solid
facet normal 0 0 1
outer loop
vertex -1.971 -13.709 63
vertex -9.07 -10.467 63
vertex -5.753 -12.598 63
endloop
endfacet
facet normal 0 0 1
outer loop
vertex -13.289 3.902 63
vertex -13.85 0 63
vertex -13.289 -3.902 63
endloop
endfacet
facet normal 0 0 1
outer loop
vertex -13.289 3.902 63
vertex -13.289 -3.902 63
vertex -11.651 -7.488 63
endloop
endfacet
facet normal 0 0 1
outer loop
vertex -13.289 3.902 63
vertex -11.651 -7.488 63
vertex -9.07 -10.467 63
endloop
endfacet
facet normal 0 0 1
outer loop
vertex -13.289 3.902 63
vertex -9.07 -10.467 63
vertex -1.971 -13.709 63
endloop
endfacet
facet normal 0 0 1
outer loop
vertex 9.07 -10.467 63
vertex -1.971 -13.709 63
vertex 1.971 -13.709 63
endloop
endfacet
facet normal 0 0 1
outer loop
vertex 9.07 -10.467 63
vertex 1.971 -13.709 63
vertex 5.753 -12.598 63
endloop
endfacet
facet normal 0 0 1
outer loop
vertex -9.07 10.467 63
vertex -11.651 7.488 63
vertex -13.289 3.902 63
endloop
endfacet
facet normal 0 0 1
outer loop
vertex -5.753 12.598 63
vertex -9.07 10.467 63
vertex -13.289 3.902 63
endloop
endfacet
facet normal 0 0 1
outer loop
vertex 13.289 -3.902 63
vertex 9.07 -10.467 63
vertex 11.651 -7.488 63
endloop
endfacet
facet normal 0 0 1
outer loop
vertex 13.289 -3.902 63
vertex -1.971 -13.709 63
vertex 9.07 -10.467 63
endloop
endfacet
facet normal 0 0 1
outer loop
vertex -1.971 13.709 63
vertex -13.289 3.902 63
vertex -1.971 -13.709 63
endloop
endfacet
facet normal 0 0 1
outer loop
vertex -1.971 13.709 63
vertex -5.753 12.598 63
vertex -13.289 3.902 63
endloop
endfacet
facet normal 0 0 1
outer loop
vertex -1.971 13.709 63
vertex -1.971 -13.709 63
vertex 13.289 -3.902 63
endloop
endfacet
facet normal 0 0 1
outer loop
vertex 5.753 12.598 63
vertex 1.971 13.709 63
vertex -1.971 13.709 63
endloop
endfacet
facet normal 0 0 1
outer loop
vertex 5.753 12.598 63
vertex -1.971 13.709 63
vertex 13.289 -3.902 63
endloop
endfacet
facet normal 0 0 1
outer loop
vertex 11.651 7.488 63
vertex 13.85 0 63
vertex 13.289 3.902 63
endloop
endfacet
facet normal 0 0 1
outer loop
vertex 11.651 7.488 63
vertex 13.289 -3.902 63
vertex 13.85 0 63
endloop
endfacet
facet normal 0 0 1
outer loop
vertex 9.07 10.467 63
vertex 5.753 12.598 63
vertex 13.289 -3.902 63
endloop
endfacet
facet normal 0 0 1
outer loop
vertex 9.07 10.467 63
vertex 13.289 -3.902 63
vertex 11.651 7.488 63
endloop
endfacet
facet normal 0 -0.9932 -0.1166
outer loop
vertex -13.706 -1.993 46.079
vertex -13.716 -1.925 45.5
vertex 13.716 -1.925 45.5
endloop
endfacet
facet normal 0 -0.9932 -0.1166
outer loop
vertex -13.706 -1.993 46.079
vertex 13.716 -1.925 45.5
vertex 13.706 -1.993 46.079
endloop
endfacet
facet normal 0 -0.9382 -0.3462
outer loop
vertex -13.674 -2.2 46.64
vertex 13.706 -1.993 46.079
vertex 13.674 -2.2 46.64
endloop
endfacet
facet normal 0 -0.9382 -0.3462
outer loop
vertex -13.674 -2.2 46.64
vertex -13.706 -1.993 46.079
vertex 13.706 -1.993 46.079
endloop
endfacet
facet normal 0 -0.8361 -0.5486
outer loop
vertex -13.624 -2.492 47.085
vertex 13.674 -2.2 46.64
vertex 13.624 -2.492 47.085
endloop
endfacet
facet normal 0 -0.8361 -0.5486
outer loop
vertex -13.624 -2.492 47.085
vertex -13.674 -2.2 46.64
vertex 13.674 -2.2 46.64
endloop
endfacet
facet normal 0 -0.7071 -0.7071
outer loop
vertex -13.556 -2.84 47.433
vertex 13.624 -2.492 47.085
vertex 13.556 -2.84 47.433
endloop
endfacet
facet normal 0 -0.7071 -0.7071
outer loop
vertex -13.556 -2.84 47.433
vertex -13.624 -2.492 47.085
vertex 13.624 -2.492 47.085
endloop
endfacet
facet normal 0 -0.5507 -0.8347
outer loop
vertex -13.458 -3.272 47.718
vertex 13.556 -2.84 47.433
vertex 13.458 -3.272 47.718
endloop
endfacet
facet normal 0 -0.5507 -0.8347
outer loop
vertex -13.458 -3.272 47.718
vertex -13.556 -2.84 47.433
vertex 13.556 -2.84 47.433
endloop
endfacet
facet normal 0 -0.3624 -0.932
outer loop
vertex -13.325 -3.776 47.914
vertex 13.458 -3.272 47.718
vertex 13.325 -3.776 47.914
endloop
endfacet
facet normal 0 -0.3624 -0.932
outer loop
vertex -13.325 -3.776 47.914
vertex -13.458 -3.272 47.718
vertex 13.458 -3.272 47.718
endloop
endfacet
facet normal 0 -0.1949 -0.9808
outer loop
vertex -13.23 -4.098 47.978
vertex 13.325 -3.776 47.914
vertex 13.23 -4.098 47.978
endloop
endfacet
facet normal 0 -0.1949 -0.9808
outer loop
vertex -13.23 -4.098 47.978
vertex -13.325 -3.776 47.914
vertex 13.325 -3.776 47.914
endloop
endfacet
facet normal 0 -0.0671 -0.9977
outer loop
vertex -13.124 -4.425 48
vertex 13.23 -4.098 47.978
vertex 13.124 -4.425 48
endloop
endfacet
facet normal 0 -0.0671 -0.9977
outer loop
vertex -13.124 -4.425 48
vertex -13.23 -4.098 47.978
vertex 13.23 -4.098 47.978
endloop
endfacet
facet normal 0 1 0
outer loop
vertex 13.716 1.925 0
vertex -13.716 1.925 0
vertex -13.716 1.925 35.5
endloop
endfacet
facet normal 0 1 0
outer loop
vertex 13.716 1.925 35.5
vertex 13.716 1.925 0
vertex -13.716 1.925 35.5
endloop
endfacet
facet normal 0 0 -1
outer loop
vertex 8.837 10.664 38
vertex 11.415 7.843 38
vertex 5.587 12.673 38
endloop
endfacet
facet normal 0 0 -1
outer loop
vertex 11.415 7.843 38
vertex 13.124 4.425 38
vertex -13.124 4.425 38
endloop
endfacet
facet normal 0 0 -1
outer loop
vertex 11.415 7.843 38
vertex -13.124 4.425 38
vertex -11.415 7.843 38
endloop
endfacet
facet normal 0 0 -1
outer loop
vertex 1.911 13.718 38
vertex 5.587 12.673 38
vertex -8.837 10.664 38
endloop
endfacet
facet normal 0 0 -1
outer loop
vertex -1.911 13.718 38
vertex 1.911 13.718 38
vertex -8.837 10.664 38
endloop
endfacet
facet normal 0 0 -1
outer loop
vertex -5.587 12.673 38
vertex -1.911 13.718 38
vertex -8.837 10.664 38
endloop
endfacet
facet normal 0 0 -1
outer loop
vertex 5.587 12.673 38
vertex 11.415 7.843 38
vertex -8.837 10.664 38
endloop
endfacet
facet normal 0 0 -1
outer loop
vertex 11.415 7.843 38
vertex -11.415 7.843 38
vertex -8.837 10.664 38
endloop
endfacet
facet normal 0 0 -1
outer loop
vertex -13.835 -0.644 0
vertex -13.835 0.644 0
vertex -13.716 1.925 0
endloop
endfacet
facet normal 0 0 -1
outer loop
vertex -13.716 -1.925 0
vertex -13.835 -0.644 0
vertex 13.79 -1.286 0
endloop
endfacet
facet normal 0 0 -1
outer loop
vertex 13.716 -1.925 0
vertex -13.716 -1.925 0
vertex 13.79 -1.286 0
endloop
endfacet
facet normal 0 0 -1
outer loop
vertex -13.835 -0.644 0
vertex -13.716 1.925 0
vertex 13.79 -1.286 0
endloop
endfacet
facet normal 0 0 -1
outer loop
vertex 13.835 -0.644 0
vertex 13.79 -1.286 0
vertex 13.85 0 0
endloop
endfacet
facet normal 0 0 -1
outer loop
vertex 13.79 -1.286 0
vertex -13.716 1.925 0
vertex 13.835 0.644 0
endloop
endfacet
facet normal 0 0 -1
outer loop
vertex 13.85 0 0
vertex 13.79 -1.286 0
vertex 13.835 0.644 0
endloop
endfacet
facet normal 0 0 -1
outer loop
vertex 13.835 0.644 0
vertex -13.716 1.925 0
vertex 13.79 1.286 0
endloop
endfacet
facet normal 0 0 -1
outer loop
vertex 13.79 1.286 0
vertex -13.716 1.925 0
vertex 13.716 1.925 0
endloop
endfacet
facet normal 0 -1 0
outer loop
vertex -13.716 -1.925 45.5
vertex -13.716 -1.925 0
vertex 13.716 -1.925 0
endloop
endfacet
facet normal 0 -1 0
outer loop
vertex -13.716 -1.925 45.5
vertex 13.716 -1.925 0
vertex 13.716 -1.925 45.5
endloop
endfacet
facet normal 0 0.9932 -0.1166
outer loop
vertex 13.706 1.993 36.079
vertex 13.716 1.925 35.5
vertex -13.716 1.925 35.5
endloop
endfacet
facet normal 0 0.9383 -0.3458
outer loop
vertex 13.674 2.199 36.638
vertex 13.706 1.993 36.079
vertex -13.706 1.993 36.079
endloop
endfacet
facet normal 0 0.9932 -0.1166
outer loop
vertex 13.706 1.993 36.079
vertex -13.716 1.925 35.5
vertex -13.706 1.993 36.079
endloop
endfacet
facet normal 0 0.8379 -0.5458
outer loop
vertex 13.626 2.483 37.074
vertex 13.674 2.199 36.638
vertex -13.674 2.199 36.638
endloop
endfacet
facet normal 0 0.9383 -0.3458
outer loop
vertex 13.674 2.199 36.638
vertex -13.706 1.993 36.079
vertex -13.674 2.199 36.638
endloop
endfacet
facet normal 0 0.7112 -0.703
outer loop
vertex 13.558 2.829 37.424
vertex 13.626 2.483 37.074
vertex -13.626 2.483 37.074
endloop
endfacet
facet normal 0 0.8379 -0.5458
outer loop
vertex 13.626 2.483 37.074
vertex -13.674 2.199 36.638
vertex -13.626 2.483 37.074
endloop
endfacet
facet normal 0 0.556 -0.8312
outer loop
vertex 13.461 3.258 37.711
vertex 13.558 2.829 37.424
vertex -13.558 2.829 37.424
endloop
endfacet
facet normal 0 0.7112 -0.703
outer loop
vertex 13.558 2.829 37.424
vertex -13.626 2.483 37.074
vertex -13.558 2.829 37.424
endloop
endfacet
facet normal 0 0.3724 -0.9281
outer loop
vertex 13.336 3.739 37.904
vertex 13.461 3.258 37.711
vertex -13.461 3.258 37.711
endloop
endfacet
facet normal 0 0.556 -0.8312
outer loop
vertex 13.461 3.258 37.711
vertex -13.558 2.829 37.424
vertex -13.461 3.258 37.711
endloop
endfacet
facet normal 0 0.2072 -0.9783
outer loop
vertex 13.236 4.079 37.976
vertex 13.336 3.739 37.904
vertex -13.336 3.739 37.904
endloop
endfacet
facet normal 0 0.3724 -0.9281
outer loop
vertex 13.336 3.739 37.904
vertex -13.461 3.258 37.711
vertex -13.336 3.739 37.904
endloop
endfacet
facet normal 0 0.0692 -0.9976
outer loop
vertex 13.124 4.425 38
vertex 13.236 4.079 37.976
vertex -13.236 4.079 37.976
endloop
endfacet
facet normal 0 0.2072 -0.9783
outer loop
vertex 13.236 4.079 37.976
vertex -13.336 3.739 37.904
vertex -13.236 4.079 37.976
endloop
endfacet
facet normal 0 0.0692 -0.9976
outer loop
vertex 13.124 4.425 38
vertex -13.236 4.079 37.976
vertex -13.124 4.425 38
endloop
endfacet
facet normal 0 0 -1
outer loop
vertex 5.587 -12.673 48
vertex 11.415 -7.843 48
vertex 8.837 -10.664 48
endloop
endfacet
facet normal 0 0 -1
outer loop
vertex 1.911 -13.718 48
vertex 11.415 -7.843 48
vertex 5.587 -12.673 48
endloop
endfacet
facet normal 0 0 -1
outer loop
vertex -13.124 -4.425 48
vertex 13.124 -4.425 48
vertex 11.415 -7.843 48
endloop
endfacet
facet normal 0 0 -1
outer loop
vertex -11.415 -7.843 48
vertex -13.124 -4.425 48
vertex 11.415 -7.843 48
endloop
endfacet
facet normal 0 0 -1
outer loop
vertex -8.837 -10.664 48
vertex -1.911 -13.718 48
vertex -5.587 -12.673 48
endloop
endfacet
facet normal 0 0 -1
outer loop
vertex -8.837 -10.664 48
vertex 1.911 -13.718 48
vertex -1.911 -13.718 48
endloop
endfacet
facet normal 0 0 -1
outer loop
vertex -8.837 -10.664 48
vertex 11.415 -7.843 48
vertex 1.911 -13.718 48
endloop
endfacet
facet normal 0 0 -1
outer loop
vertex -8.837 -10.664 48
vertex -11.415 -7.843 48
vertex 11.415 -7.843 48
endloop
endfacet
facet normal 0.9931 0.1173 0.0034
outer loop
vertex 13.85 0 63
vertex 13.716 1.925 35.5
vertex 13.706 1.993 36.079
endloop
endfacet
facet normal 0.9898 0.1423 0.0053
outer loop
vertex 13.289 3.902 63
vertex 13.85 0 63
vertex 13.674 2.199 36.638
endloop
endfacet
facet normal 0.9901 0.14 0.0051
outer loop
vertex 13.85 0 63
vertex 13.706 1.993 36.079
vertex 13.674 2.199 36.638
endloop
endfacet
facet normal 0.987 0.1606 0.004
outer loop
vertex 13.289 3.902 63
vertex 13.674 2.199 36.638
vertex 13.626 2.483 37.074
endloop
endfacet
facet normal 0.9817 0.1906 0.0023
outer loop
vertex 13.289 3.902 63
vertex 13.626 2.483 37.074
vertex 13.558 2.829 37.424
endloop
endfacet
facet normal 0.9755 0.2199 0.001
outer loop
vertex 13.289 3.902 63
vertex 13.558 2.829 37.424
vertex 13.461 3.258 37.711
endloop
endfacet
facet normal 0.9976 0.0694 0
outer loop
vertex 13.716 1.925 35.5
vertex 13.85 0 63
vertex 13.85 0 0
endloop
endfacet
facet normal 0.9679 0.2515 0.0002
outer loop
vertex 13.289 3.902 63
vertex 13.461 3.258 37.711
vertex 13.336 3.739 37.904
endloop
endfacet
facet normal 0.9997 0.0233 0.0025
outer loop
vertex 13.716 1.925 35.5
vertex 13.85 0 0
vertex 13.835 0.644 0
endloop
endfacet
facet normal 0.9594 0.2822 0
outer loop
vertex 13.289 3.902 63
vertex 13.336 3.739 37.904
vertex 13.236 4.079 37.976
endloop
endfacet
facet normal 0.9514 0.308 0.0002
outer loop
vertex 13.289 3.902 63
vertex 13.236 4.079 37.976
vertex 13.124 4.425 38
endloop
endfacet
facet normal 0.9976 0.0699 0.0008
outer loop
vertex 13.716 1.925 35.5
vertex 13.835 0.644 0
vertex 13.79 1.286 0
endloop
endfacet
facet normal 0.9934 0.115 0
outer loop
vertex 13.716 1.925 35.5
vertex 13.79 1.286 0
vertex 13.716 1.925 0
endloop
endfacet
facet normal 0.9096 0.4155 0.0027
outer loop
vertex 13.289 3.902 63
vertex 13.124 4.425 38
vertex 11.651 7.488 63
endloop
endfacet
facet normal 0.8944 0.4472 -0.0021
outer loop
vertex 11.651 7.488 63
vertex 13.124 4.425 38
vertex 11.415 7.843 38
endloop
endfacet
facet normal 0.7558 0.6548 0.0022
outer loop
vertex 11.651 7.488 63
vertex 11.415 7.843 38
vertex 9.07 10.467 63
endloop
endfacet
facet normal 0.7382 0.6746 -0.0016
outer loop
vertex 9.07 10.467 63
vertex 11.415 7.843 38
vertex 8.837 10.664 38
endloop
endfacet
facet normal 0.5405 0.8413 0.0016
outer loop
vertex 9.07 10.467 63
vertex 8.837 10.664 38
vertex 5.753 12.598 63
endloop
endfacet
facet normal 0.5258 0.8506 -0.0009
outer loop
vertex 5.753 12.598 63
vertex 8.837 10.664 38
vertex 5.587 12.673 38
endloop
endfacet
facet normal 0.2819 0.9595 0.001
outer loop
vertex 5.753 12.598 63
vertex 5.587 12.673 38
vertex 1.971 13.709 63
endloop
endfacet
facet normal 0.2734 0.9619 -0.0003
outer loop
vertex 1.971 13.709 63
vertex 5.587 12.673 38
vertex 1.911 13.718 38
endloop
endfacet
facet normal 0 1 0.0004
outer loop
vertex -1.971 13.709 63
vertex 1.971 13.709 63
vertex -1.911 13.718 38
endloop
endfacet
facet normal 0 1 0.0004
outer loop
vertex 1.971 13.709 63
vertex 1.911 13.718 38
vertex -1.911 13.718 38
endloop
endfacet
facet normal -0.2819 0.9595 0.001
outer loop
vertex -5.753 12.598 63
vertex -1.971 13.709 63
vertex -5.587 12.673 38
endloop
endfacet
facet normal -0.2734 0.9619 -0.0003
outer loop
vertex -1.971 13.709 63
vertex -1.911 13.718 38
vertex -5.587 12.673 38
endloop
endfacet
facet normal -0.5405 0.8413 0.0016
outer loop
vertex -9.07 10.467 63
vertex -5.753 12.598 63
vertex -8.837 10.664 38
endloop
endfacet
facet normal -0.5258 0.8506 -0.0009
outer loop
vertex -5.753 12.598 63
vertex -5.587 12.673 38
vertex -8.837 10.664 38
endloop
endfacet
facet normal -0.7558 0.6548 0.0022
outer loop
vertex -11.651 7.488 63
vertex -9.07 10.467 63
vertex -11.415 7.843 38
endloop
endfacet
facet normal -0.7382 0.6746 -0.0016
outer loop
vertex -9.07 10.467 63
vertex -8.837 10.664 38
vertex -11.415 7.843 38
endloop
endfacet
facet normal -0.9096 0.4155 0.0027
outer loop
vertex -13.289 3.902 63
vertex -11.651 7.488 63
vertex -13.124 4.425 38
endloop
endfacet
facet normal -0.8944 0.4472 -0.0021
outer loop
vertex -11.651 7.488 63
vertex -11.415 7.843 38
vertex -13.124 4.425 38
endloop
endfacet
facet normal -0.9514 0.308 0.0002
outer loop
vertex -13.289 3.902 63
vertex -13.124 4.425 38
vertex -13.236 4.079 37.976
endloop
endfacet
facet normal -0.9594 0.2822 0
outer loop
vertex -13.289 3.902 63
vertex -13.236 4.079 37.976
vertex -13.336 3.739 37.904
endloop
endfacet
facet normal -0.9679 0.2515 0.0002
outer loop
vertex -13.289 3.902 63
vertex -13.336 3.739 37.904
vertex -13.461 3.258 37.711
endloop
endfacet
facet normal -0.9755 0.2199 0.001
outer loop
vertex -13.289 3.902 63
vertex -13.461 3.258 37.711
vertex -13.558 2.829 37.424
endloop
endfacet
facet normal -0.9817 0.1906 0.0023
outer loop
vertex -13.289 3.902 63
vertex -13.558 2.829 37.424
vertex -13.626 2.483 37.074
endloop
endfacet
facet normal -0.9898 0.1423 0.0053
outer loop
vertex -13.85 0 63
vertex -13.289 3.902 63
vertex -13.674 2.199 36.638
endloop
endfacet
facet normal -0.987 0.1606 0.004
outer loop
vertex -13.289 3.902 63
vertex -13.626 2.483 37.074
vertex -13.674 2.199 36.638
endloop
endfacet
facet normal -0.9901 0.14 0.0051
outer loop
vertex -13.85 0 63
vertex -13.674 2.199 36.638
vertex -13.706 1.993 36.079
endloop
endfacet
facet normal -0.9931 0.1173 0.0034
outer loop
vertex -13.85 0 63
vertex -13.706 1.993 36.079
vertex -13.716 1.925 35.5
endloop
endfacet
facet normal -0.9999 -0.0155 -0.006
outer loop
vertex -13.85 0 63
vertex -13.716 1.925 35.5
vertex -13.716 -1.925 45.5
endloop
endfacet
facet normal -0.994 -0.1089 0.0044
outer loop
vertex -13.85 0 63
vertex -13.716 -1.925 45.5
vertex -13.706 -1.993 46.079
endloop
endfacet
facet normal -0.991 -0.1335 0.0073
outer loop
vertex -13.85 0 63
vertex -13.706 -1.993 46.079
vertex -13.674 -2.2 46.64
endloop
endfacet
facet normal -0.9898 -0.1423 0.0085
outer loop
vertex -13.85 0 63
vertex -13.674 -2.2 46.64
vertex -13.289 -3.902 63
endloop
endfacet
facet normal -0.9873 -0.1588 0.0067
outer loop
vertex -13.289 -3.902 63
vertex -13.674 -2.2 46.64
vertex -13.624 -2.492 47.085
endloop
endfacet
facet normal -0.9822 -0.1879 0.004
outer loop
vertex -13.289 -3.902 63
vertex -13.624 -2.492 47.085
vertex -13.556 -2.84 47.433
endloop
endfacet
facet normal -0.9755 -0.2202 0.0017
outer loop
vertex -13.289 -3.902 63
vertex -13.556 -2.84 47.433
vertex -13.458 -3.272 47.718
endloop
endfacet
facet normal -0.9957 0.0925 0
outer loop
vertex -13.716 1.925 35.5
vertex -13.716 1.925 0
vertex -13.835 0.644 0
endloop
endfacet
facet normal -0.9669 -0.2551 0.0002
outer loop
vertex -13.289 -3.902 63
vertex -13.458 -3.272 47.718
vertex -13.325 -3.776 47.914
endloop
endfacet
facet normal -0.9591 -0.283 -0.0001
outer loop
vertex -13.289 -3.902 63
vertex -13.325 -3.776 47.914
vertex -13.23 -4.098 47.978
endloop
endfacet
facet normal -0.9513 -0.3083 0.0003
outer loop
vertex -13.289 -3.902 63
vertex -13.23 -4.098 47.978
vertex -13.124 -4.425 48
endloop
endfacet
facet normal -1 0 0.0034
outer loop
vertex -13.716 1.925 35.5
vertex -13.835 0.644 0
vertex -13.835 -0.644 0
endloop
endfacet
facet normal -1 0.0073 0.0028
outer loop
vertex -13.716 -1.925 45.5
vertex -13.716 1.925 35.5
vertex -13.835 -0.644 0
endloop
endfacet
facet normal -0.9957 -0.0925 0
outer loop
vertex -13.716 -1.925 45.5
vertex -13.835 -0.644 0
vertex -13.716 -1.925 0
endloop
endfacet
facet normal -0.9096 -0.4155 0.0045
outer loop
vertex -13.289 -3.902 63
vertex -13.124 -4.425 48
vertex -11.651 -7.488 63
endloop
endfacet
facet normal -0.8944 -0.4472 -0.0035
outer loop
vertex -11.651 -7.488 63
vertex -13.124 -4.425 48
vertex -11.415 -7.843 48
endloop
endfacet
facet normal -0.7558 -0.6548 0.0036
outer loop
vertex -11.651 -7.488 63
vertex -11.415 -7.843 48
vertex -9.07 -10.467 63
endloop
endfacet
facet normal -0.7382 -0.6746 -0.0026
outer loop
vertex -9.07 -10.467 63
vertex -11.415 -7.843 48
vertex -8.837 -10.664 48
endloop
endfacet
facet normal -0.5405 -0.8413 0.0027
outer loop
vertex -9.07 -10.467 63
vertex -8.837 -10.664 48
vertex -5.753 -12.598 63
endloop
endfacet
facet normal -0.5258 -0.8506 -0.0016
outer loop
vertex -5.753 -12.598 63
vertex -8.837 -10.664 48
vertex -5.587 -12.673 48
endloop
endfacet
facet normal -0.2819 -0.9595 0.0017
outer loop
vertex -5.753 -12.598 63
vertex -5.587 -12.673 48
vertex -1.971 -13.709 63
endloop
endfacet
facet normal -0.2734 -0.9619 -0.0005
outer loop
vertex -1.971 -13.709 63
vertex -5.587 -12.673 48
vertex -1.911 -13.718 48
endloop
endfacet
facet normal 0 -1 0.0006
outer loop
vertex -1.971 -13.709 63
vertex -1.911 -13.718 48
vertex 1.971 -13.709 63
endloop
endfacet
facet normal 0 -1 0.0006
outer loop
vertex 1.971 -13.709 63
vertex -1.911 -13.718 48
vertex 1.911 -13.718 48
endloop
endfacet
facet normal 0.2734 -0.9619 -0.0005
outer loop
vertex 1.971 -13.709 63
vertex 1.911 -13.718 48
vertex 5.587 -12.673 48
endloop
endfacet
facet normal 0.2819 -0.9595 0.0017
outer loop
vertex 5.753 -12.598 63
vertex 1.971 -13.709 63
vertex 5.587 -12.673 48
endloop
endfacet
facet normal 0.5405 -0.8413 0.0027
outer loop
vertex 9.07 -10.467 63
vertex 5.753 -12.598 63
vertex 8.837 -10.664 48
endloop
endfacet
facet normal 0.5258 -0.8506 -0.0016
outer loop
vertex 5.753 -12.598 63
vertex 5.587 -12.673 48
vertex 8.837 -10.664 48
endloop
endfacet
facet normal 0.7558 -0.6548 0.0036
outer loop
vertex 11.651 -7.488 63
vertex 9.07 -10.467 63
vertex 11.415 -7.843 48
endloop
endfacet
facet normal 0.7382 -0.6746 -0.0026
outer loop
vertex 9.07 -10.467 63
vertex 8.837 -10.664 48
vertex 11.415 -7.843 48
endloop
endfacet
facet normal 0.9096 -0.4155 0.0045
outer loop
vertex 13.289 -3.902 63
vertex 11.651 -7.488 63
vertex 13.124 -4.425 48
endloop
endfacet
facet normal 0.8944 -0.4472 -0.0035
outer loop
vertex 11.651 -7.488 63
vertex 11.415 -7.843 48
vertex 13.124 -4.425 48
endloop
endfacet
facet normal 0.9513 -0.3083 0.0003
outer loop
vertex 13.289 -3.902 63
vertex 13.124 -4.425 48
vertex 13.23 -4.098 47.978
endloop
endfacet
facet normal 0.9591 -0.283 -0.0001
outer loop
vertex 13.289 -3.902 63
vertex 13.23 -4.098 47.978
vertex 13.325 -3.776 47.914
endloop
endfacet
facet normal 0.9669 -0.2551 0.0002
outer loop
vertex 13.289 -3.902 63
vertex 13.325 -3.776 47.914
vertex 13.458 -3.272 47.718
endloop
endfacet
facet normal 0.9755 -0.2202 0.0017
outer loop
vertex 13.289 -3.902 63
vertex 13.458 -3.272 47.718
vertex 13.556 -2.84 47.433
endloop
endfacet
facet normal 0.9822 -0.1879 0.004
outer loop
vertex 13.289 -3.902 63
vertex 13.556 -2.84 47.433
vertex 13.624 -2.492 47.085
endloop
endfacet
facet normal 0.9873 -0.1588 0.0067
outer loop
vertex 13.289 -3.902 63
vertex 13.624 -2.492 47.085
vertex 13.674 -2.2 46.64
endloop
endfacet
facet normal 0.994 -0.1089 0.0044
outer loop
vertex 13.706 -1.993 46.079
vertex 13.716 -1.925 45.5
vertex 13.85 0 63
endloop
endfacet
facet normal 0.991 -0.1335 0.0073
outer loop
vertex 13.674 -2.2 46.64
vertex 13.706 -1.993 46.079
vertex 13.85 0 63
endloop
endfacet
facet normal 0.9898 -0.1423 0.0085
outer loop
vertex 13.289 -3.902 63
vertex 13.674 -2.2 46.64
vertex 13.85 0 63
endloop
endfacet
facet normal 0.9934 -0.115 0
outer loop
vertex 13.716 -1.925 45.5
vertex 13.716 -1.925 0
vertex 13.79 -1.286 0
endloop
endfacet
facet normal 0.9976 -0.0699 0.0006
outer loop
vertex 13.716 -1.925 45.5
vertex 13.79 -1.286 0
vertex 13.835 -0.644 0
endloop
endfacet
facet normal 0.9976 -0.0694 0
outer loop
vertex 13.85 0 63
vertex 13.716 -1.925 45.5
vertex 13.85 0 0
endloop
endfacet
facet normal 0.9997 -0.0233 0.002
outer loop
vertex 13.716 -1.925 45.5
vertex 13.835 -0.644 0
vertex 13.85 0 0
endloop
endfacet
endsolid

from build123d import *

# Parameters (mm, degrees)
SKETCH1_R               = 13.85
BOSS_EXTRUDE1_DEPTH     = 63
CUT_EXTRUDE1_DEPTH      = 66.974578437
CUT_EXTRUDE1_DEPTH_BACK = 66.974578437


with BuildPart() as part:
    # Sketch1 → Boss-Extrude1 (new body)
    with BuildSketch(Plane.XY):
        Circle(SKETCH1_R)
    extrude(amount=BOSS_EXTRUDE1_DEPTH)

    # Sketch3 → Cut-Extrude1 (cut, two sides: drawn at the far end of the back side and taken through both)
    with BuildSketch(Plane(origin=(0, 0, 0), x_dir=(0, 0, -1), z_dir=(1, 0, 0)).offset(-CUT_EXTRUDE1_DEPTH_BACK)):
        with BuildLine():
            Line((0, 1.925), (-35.5, 1.925))
            ThreePointArc((-35.5, 1.925), (-37.267766953, 2.657233047), (-38, 4.425))
            Line((-38, 4.425), (-38, 13.85))
            Line((-38, 13.85), (0, 13.85))
            Line((0, 13.85), (0, 1.925))
        make_face()
        with BuildLine():
            Line((0, -1.925), (-45.5, -1.925))
            ThreePointArc((-45.5, -1.925), (-47.267766953, -2.657233047), (-48, -4.425))
            Line((-48, -4.425), (-48, -13.85))
            Line((-48, -13.85), (0, -13.85))
            Line((0, -13.85), (0, -1.925))
        make_face()
    extrude(amount=CUT_EXTRUDE1_DEPTH + CUT_EXTRUDE1_DEPTH_BACK, mode=Mode.SUBTRACT)


solid = part.part
